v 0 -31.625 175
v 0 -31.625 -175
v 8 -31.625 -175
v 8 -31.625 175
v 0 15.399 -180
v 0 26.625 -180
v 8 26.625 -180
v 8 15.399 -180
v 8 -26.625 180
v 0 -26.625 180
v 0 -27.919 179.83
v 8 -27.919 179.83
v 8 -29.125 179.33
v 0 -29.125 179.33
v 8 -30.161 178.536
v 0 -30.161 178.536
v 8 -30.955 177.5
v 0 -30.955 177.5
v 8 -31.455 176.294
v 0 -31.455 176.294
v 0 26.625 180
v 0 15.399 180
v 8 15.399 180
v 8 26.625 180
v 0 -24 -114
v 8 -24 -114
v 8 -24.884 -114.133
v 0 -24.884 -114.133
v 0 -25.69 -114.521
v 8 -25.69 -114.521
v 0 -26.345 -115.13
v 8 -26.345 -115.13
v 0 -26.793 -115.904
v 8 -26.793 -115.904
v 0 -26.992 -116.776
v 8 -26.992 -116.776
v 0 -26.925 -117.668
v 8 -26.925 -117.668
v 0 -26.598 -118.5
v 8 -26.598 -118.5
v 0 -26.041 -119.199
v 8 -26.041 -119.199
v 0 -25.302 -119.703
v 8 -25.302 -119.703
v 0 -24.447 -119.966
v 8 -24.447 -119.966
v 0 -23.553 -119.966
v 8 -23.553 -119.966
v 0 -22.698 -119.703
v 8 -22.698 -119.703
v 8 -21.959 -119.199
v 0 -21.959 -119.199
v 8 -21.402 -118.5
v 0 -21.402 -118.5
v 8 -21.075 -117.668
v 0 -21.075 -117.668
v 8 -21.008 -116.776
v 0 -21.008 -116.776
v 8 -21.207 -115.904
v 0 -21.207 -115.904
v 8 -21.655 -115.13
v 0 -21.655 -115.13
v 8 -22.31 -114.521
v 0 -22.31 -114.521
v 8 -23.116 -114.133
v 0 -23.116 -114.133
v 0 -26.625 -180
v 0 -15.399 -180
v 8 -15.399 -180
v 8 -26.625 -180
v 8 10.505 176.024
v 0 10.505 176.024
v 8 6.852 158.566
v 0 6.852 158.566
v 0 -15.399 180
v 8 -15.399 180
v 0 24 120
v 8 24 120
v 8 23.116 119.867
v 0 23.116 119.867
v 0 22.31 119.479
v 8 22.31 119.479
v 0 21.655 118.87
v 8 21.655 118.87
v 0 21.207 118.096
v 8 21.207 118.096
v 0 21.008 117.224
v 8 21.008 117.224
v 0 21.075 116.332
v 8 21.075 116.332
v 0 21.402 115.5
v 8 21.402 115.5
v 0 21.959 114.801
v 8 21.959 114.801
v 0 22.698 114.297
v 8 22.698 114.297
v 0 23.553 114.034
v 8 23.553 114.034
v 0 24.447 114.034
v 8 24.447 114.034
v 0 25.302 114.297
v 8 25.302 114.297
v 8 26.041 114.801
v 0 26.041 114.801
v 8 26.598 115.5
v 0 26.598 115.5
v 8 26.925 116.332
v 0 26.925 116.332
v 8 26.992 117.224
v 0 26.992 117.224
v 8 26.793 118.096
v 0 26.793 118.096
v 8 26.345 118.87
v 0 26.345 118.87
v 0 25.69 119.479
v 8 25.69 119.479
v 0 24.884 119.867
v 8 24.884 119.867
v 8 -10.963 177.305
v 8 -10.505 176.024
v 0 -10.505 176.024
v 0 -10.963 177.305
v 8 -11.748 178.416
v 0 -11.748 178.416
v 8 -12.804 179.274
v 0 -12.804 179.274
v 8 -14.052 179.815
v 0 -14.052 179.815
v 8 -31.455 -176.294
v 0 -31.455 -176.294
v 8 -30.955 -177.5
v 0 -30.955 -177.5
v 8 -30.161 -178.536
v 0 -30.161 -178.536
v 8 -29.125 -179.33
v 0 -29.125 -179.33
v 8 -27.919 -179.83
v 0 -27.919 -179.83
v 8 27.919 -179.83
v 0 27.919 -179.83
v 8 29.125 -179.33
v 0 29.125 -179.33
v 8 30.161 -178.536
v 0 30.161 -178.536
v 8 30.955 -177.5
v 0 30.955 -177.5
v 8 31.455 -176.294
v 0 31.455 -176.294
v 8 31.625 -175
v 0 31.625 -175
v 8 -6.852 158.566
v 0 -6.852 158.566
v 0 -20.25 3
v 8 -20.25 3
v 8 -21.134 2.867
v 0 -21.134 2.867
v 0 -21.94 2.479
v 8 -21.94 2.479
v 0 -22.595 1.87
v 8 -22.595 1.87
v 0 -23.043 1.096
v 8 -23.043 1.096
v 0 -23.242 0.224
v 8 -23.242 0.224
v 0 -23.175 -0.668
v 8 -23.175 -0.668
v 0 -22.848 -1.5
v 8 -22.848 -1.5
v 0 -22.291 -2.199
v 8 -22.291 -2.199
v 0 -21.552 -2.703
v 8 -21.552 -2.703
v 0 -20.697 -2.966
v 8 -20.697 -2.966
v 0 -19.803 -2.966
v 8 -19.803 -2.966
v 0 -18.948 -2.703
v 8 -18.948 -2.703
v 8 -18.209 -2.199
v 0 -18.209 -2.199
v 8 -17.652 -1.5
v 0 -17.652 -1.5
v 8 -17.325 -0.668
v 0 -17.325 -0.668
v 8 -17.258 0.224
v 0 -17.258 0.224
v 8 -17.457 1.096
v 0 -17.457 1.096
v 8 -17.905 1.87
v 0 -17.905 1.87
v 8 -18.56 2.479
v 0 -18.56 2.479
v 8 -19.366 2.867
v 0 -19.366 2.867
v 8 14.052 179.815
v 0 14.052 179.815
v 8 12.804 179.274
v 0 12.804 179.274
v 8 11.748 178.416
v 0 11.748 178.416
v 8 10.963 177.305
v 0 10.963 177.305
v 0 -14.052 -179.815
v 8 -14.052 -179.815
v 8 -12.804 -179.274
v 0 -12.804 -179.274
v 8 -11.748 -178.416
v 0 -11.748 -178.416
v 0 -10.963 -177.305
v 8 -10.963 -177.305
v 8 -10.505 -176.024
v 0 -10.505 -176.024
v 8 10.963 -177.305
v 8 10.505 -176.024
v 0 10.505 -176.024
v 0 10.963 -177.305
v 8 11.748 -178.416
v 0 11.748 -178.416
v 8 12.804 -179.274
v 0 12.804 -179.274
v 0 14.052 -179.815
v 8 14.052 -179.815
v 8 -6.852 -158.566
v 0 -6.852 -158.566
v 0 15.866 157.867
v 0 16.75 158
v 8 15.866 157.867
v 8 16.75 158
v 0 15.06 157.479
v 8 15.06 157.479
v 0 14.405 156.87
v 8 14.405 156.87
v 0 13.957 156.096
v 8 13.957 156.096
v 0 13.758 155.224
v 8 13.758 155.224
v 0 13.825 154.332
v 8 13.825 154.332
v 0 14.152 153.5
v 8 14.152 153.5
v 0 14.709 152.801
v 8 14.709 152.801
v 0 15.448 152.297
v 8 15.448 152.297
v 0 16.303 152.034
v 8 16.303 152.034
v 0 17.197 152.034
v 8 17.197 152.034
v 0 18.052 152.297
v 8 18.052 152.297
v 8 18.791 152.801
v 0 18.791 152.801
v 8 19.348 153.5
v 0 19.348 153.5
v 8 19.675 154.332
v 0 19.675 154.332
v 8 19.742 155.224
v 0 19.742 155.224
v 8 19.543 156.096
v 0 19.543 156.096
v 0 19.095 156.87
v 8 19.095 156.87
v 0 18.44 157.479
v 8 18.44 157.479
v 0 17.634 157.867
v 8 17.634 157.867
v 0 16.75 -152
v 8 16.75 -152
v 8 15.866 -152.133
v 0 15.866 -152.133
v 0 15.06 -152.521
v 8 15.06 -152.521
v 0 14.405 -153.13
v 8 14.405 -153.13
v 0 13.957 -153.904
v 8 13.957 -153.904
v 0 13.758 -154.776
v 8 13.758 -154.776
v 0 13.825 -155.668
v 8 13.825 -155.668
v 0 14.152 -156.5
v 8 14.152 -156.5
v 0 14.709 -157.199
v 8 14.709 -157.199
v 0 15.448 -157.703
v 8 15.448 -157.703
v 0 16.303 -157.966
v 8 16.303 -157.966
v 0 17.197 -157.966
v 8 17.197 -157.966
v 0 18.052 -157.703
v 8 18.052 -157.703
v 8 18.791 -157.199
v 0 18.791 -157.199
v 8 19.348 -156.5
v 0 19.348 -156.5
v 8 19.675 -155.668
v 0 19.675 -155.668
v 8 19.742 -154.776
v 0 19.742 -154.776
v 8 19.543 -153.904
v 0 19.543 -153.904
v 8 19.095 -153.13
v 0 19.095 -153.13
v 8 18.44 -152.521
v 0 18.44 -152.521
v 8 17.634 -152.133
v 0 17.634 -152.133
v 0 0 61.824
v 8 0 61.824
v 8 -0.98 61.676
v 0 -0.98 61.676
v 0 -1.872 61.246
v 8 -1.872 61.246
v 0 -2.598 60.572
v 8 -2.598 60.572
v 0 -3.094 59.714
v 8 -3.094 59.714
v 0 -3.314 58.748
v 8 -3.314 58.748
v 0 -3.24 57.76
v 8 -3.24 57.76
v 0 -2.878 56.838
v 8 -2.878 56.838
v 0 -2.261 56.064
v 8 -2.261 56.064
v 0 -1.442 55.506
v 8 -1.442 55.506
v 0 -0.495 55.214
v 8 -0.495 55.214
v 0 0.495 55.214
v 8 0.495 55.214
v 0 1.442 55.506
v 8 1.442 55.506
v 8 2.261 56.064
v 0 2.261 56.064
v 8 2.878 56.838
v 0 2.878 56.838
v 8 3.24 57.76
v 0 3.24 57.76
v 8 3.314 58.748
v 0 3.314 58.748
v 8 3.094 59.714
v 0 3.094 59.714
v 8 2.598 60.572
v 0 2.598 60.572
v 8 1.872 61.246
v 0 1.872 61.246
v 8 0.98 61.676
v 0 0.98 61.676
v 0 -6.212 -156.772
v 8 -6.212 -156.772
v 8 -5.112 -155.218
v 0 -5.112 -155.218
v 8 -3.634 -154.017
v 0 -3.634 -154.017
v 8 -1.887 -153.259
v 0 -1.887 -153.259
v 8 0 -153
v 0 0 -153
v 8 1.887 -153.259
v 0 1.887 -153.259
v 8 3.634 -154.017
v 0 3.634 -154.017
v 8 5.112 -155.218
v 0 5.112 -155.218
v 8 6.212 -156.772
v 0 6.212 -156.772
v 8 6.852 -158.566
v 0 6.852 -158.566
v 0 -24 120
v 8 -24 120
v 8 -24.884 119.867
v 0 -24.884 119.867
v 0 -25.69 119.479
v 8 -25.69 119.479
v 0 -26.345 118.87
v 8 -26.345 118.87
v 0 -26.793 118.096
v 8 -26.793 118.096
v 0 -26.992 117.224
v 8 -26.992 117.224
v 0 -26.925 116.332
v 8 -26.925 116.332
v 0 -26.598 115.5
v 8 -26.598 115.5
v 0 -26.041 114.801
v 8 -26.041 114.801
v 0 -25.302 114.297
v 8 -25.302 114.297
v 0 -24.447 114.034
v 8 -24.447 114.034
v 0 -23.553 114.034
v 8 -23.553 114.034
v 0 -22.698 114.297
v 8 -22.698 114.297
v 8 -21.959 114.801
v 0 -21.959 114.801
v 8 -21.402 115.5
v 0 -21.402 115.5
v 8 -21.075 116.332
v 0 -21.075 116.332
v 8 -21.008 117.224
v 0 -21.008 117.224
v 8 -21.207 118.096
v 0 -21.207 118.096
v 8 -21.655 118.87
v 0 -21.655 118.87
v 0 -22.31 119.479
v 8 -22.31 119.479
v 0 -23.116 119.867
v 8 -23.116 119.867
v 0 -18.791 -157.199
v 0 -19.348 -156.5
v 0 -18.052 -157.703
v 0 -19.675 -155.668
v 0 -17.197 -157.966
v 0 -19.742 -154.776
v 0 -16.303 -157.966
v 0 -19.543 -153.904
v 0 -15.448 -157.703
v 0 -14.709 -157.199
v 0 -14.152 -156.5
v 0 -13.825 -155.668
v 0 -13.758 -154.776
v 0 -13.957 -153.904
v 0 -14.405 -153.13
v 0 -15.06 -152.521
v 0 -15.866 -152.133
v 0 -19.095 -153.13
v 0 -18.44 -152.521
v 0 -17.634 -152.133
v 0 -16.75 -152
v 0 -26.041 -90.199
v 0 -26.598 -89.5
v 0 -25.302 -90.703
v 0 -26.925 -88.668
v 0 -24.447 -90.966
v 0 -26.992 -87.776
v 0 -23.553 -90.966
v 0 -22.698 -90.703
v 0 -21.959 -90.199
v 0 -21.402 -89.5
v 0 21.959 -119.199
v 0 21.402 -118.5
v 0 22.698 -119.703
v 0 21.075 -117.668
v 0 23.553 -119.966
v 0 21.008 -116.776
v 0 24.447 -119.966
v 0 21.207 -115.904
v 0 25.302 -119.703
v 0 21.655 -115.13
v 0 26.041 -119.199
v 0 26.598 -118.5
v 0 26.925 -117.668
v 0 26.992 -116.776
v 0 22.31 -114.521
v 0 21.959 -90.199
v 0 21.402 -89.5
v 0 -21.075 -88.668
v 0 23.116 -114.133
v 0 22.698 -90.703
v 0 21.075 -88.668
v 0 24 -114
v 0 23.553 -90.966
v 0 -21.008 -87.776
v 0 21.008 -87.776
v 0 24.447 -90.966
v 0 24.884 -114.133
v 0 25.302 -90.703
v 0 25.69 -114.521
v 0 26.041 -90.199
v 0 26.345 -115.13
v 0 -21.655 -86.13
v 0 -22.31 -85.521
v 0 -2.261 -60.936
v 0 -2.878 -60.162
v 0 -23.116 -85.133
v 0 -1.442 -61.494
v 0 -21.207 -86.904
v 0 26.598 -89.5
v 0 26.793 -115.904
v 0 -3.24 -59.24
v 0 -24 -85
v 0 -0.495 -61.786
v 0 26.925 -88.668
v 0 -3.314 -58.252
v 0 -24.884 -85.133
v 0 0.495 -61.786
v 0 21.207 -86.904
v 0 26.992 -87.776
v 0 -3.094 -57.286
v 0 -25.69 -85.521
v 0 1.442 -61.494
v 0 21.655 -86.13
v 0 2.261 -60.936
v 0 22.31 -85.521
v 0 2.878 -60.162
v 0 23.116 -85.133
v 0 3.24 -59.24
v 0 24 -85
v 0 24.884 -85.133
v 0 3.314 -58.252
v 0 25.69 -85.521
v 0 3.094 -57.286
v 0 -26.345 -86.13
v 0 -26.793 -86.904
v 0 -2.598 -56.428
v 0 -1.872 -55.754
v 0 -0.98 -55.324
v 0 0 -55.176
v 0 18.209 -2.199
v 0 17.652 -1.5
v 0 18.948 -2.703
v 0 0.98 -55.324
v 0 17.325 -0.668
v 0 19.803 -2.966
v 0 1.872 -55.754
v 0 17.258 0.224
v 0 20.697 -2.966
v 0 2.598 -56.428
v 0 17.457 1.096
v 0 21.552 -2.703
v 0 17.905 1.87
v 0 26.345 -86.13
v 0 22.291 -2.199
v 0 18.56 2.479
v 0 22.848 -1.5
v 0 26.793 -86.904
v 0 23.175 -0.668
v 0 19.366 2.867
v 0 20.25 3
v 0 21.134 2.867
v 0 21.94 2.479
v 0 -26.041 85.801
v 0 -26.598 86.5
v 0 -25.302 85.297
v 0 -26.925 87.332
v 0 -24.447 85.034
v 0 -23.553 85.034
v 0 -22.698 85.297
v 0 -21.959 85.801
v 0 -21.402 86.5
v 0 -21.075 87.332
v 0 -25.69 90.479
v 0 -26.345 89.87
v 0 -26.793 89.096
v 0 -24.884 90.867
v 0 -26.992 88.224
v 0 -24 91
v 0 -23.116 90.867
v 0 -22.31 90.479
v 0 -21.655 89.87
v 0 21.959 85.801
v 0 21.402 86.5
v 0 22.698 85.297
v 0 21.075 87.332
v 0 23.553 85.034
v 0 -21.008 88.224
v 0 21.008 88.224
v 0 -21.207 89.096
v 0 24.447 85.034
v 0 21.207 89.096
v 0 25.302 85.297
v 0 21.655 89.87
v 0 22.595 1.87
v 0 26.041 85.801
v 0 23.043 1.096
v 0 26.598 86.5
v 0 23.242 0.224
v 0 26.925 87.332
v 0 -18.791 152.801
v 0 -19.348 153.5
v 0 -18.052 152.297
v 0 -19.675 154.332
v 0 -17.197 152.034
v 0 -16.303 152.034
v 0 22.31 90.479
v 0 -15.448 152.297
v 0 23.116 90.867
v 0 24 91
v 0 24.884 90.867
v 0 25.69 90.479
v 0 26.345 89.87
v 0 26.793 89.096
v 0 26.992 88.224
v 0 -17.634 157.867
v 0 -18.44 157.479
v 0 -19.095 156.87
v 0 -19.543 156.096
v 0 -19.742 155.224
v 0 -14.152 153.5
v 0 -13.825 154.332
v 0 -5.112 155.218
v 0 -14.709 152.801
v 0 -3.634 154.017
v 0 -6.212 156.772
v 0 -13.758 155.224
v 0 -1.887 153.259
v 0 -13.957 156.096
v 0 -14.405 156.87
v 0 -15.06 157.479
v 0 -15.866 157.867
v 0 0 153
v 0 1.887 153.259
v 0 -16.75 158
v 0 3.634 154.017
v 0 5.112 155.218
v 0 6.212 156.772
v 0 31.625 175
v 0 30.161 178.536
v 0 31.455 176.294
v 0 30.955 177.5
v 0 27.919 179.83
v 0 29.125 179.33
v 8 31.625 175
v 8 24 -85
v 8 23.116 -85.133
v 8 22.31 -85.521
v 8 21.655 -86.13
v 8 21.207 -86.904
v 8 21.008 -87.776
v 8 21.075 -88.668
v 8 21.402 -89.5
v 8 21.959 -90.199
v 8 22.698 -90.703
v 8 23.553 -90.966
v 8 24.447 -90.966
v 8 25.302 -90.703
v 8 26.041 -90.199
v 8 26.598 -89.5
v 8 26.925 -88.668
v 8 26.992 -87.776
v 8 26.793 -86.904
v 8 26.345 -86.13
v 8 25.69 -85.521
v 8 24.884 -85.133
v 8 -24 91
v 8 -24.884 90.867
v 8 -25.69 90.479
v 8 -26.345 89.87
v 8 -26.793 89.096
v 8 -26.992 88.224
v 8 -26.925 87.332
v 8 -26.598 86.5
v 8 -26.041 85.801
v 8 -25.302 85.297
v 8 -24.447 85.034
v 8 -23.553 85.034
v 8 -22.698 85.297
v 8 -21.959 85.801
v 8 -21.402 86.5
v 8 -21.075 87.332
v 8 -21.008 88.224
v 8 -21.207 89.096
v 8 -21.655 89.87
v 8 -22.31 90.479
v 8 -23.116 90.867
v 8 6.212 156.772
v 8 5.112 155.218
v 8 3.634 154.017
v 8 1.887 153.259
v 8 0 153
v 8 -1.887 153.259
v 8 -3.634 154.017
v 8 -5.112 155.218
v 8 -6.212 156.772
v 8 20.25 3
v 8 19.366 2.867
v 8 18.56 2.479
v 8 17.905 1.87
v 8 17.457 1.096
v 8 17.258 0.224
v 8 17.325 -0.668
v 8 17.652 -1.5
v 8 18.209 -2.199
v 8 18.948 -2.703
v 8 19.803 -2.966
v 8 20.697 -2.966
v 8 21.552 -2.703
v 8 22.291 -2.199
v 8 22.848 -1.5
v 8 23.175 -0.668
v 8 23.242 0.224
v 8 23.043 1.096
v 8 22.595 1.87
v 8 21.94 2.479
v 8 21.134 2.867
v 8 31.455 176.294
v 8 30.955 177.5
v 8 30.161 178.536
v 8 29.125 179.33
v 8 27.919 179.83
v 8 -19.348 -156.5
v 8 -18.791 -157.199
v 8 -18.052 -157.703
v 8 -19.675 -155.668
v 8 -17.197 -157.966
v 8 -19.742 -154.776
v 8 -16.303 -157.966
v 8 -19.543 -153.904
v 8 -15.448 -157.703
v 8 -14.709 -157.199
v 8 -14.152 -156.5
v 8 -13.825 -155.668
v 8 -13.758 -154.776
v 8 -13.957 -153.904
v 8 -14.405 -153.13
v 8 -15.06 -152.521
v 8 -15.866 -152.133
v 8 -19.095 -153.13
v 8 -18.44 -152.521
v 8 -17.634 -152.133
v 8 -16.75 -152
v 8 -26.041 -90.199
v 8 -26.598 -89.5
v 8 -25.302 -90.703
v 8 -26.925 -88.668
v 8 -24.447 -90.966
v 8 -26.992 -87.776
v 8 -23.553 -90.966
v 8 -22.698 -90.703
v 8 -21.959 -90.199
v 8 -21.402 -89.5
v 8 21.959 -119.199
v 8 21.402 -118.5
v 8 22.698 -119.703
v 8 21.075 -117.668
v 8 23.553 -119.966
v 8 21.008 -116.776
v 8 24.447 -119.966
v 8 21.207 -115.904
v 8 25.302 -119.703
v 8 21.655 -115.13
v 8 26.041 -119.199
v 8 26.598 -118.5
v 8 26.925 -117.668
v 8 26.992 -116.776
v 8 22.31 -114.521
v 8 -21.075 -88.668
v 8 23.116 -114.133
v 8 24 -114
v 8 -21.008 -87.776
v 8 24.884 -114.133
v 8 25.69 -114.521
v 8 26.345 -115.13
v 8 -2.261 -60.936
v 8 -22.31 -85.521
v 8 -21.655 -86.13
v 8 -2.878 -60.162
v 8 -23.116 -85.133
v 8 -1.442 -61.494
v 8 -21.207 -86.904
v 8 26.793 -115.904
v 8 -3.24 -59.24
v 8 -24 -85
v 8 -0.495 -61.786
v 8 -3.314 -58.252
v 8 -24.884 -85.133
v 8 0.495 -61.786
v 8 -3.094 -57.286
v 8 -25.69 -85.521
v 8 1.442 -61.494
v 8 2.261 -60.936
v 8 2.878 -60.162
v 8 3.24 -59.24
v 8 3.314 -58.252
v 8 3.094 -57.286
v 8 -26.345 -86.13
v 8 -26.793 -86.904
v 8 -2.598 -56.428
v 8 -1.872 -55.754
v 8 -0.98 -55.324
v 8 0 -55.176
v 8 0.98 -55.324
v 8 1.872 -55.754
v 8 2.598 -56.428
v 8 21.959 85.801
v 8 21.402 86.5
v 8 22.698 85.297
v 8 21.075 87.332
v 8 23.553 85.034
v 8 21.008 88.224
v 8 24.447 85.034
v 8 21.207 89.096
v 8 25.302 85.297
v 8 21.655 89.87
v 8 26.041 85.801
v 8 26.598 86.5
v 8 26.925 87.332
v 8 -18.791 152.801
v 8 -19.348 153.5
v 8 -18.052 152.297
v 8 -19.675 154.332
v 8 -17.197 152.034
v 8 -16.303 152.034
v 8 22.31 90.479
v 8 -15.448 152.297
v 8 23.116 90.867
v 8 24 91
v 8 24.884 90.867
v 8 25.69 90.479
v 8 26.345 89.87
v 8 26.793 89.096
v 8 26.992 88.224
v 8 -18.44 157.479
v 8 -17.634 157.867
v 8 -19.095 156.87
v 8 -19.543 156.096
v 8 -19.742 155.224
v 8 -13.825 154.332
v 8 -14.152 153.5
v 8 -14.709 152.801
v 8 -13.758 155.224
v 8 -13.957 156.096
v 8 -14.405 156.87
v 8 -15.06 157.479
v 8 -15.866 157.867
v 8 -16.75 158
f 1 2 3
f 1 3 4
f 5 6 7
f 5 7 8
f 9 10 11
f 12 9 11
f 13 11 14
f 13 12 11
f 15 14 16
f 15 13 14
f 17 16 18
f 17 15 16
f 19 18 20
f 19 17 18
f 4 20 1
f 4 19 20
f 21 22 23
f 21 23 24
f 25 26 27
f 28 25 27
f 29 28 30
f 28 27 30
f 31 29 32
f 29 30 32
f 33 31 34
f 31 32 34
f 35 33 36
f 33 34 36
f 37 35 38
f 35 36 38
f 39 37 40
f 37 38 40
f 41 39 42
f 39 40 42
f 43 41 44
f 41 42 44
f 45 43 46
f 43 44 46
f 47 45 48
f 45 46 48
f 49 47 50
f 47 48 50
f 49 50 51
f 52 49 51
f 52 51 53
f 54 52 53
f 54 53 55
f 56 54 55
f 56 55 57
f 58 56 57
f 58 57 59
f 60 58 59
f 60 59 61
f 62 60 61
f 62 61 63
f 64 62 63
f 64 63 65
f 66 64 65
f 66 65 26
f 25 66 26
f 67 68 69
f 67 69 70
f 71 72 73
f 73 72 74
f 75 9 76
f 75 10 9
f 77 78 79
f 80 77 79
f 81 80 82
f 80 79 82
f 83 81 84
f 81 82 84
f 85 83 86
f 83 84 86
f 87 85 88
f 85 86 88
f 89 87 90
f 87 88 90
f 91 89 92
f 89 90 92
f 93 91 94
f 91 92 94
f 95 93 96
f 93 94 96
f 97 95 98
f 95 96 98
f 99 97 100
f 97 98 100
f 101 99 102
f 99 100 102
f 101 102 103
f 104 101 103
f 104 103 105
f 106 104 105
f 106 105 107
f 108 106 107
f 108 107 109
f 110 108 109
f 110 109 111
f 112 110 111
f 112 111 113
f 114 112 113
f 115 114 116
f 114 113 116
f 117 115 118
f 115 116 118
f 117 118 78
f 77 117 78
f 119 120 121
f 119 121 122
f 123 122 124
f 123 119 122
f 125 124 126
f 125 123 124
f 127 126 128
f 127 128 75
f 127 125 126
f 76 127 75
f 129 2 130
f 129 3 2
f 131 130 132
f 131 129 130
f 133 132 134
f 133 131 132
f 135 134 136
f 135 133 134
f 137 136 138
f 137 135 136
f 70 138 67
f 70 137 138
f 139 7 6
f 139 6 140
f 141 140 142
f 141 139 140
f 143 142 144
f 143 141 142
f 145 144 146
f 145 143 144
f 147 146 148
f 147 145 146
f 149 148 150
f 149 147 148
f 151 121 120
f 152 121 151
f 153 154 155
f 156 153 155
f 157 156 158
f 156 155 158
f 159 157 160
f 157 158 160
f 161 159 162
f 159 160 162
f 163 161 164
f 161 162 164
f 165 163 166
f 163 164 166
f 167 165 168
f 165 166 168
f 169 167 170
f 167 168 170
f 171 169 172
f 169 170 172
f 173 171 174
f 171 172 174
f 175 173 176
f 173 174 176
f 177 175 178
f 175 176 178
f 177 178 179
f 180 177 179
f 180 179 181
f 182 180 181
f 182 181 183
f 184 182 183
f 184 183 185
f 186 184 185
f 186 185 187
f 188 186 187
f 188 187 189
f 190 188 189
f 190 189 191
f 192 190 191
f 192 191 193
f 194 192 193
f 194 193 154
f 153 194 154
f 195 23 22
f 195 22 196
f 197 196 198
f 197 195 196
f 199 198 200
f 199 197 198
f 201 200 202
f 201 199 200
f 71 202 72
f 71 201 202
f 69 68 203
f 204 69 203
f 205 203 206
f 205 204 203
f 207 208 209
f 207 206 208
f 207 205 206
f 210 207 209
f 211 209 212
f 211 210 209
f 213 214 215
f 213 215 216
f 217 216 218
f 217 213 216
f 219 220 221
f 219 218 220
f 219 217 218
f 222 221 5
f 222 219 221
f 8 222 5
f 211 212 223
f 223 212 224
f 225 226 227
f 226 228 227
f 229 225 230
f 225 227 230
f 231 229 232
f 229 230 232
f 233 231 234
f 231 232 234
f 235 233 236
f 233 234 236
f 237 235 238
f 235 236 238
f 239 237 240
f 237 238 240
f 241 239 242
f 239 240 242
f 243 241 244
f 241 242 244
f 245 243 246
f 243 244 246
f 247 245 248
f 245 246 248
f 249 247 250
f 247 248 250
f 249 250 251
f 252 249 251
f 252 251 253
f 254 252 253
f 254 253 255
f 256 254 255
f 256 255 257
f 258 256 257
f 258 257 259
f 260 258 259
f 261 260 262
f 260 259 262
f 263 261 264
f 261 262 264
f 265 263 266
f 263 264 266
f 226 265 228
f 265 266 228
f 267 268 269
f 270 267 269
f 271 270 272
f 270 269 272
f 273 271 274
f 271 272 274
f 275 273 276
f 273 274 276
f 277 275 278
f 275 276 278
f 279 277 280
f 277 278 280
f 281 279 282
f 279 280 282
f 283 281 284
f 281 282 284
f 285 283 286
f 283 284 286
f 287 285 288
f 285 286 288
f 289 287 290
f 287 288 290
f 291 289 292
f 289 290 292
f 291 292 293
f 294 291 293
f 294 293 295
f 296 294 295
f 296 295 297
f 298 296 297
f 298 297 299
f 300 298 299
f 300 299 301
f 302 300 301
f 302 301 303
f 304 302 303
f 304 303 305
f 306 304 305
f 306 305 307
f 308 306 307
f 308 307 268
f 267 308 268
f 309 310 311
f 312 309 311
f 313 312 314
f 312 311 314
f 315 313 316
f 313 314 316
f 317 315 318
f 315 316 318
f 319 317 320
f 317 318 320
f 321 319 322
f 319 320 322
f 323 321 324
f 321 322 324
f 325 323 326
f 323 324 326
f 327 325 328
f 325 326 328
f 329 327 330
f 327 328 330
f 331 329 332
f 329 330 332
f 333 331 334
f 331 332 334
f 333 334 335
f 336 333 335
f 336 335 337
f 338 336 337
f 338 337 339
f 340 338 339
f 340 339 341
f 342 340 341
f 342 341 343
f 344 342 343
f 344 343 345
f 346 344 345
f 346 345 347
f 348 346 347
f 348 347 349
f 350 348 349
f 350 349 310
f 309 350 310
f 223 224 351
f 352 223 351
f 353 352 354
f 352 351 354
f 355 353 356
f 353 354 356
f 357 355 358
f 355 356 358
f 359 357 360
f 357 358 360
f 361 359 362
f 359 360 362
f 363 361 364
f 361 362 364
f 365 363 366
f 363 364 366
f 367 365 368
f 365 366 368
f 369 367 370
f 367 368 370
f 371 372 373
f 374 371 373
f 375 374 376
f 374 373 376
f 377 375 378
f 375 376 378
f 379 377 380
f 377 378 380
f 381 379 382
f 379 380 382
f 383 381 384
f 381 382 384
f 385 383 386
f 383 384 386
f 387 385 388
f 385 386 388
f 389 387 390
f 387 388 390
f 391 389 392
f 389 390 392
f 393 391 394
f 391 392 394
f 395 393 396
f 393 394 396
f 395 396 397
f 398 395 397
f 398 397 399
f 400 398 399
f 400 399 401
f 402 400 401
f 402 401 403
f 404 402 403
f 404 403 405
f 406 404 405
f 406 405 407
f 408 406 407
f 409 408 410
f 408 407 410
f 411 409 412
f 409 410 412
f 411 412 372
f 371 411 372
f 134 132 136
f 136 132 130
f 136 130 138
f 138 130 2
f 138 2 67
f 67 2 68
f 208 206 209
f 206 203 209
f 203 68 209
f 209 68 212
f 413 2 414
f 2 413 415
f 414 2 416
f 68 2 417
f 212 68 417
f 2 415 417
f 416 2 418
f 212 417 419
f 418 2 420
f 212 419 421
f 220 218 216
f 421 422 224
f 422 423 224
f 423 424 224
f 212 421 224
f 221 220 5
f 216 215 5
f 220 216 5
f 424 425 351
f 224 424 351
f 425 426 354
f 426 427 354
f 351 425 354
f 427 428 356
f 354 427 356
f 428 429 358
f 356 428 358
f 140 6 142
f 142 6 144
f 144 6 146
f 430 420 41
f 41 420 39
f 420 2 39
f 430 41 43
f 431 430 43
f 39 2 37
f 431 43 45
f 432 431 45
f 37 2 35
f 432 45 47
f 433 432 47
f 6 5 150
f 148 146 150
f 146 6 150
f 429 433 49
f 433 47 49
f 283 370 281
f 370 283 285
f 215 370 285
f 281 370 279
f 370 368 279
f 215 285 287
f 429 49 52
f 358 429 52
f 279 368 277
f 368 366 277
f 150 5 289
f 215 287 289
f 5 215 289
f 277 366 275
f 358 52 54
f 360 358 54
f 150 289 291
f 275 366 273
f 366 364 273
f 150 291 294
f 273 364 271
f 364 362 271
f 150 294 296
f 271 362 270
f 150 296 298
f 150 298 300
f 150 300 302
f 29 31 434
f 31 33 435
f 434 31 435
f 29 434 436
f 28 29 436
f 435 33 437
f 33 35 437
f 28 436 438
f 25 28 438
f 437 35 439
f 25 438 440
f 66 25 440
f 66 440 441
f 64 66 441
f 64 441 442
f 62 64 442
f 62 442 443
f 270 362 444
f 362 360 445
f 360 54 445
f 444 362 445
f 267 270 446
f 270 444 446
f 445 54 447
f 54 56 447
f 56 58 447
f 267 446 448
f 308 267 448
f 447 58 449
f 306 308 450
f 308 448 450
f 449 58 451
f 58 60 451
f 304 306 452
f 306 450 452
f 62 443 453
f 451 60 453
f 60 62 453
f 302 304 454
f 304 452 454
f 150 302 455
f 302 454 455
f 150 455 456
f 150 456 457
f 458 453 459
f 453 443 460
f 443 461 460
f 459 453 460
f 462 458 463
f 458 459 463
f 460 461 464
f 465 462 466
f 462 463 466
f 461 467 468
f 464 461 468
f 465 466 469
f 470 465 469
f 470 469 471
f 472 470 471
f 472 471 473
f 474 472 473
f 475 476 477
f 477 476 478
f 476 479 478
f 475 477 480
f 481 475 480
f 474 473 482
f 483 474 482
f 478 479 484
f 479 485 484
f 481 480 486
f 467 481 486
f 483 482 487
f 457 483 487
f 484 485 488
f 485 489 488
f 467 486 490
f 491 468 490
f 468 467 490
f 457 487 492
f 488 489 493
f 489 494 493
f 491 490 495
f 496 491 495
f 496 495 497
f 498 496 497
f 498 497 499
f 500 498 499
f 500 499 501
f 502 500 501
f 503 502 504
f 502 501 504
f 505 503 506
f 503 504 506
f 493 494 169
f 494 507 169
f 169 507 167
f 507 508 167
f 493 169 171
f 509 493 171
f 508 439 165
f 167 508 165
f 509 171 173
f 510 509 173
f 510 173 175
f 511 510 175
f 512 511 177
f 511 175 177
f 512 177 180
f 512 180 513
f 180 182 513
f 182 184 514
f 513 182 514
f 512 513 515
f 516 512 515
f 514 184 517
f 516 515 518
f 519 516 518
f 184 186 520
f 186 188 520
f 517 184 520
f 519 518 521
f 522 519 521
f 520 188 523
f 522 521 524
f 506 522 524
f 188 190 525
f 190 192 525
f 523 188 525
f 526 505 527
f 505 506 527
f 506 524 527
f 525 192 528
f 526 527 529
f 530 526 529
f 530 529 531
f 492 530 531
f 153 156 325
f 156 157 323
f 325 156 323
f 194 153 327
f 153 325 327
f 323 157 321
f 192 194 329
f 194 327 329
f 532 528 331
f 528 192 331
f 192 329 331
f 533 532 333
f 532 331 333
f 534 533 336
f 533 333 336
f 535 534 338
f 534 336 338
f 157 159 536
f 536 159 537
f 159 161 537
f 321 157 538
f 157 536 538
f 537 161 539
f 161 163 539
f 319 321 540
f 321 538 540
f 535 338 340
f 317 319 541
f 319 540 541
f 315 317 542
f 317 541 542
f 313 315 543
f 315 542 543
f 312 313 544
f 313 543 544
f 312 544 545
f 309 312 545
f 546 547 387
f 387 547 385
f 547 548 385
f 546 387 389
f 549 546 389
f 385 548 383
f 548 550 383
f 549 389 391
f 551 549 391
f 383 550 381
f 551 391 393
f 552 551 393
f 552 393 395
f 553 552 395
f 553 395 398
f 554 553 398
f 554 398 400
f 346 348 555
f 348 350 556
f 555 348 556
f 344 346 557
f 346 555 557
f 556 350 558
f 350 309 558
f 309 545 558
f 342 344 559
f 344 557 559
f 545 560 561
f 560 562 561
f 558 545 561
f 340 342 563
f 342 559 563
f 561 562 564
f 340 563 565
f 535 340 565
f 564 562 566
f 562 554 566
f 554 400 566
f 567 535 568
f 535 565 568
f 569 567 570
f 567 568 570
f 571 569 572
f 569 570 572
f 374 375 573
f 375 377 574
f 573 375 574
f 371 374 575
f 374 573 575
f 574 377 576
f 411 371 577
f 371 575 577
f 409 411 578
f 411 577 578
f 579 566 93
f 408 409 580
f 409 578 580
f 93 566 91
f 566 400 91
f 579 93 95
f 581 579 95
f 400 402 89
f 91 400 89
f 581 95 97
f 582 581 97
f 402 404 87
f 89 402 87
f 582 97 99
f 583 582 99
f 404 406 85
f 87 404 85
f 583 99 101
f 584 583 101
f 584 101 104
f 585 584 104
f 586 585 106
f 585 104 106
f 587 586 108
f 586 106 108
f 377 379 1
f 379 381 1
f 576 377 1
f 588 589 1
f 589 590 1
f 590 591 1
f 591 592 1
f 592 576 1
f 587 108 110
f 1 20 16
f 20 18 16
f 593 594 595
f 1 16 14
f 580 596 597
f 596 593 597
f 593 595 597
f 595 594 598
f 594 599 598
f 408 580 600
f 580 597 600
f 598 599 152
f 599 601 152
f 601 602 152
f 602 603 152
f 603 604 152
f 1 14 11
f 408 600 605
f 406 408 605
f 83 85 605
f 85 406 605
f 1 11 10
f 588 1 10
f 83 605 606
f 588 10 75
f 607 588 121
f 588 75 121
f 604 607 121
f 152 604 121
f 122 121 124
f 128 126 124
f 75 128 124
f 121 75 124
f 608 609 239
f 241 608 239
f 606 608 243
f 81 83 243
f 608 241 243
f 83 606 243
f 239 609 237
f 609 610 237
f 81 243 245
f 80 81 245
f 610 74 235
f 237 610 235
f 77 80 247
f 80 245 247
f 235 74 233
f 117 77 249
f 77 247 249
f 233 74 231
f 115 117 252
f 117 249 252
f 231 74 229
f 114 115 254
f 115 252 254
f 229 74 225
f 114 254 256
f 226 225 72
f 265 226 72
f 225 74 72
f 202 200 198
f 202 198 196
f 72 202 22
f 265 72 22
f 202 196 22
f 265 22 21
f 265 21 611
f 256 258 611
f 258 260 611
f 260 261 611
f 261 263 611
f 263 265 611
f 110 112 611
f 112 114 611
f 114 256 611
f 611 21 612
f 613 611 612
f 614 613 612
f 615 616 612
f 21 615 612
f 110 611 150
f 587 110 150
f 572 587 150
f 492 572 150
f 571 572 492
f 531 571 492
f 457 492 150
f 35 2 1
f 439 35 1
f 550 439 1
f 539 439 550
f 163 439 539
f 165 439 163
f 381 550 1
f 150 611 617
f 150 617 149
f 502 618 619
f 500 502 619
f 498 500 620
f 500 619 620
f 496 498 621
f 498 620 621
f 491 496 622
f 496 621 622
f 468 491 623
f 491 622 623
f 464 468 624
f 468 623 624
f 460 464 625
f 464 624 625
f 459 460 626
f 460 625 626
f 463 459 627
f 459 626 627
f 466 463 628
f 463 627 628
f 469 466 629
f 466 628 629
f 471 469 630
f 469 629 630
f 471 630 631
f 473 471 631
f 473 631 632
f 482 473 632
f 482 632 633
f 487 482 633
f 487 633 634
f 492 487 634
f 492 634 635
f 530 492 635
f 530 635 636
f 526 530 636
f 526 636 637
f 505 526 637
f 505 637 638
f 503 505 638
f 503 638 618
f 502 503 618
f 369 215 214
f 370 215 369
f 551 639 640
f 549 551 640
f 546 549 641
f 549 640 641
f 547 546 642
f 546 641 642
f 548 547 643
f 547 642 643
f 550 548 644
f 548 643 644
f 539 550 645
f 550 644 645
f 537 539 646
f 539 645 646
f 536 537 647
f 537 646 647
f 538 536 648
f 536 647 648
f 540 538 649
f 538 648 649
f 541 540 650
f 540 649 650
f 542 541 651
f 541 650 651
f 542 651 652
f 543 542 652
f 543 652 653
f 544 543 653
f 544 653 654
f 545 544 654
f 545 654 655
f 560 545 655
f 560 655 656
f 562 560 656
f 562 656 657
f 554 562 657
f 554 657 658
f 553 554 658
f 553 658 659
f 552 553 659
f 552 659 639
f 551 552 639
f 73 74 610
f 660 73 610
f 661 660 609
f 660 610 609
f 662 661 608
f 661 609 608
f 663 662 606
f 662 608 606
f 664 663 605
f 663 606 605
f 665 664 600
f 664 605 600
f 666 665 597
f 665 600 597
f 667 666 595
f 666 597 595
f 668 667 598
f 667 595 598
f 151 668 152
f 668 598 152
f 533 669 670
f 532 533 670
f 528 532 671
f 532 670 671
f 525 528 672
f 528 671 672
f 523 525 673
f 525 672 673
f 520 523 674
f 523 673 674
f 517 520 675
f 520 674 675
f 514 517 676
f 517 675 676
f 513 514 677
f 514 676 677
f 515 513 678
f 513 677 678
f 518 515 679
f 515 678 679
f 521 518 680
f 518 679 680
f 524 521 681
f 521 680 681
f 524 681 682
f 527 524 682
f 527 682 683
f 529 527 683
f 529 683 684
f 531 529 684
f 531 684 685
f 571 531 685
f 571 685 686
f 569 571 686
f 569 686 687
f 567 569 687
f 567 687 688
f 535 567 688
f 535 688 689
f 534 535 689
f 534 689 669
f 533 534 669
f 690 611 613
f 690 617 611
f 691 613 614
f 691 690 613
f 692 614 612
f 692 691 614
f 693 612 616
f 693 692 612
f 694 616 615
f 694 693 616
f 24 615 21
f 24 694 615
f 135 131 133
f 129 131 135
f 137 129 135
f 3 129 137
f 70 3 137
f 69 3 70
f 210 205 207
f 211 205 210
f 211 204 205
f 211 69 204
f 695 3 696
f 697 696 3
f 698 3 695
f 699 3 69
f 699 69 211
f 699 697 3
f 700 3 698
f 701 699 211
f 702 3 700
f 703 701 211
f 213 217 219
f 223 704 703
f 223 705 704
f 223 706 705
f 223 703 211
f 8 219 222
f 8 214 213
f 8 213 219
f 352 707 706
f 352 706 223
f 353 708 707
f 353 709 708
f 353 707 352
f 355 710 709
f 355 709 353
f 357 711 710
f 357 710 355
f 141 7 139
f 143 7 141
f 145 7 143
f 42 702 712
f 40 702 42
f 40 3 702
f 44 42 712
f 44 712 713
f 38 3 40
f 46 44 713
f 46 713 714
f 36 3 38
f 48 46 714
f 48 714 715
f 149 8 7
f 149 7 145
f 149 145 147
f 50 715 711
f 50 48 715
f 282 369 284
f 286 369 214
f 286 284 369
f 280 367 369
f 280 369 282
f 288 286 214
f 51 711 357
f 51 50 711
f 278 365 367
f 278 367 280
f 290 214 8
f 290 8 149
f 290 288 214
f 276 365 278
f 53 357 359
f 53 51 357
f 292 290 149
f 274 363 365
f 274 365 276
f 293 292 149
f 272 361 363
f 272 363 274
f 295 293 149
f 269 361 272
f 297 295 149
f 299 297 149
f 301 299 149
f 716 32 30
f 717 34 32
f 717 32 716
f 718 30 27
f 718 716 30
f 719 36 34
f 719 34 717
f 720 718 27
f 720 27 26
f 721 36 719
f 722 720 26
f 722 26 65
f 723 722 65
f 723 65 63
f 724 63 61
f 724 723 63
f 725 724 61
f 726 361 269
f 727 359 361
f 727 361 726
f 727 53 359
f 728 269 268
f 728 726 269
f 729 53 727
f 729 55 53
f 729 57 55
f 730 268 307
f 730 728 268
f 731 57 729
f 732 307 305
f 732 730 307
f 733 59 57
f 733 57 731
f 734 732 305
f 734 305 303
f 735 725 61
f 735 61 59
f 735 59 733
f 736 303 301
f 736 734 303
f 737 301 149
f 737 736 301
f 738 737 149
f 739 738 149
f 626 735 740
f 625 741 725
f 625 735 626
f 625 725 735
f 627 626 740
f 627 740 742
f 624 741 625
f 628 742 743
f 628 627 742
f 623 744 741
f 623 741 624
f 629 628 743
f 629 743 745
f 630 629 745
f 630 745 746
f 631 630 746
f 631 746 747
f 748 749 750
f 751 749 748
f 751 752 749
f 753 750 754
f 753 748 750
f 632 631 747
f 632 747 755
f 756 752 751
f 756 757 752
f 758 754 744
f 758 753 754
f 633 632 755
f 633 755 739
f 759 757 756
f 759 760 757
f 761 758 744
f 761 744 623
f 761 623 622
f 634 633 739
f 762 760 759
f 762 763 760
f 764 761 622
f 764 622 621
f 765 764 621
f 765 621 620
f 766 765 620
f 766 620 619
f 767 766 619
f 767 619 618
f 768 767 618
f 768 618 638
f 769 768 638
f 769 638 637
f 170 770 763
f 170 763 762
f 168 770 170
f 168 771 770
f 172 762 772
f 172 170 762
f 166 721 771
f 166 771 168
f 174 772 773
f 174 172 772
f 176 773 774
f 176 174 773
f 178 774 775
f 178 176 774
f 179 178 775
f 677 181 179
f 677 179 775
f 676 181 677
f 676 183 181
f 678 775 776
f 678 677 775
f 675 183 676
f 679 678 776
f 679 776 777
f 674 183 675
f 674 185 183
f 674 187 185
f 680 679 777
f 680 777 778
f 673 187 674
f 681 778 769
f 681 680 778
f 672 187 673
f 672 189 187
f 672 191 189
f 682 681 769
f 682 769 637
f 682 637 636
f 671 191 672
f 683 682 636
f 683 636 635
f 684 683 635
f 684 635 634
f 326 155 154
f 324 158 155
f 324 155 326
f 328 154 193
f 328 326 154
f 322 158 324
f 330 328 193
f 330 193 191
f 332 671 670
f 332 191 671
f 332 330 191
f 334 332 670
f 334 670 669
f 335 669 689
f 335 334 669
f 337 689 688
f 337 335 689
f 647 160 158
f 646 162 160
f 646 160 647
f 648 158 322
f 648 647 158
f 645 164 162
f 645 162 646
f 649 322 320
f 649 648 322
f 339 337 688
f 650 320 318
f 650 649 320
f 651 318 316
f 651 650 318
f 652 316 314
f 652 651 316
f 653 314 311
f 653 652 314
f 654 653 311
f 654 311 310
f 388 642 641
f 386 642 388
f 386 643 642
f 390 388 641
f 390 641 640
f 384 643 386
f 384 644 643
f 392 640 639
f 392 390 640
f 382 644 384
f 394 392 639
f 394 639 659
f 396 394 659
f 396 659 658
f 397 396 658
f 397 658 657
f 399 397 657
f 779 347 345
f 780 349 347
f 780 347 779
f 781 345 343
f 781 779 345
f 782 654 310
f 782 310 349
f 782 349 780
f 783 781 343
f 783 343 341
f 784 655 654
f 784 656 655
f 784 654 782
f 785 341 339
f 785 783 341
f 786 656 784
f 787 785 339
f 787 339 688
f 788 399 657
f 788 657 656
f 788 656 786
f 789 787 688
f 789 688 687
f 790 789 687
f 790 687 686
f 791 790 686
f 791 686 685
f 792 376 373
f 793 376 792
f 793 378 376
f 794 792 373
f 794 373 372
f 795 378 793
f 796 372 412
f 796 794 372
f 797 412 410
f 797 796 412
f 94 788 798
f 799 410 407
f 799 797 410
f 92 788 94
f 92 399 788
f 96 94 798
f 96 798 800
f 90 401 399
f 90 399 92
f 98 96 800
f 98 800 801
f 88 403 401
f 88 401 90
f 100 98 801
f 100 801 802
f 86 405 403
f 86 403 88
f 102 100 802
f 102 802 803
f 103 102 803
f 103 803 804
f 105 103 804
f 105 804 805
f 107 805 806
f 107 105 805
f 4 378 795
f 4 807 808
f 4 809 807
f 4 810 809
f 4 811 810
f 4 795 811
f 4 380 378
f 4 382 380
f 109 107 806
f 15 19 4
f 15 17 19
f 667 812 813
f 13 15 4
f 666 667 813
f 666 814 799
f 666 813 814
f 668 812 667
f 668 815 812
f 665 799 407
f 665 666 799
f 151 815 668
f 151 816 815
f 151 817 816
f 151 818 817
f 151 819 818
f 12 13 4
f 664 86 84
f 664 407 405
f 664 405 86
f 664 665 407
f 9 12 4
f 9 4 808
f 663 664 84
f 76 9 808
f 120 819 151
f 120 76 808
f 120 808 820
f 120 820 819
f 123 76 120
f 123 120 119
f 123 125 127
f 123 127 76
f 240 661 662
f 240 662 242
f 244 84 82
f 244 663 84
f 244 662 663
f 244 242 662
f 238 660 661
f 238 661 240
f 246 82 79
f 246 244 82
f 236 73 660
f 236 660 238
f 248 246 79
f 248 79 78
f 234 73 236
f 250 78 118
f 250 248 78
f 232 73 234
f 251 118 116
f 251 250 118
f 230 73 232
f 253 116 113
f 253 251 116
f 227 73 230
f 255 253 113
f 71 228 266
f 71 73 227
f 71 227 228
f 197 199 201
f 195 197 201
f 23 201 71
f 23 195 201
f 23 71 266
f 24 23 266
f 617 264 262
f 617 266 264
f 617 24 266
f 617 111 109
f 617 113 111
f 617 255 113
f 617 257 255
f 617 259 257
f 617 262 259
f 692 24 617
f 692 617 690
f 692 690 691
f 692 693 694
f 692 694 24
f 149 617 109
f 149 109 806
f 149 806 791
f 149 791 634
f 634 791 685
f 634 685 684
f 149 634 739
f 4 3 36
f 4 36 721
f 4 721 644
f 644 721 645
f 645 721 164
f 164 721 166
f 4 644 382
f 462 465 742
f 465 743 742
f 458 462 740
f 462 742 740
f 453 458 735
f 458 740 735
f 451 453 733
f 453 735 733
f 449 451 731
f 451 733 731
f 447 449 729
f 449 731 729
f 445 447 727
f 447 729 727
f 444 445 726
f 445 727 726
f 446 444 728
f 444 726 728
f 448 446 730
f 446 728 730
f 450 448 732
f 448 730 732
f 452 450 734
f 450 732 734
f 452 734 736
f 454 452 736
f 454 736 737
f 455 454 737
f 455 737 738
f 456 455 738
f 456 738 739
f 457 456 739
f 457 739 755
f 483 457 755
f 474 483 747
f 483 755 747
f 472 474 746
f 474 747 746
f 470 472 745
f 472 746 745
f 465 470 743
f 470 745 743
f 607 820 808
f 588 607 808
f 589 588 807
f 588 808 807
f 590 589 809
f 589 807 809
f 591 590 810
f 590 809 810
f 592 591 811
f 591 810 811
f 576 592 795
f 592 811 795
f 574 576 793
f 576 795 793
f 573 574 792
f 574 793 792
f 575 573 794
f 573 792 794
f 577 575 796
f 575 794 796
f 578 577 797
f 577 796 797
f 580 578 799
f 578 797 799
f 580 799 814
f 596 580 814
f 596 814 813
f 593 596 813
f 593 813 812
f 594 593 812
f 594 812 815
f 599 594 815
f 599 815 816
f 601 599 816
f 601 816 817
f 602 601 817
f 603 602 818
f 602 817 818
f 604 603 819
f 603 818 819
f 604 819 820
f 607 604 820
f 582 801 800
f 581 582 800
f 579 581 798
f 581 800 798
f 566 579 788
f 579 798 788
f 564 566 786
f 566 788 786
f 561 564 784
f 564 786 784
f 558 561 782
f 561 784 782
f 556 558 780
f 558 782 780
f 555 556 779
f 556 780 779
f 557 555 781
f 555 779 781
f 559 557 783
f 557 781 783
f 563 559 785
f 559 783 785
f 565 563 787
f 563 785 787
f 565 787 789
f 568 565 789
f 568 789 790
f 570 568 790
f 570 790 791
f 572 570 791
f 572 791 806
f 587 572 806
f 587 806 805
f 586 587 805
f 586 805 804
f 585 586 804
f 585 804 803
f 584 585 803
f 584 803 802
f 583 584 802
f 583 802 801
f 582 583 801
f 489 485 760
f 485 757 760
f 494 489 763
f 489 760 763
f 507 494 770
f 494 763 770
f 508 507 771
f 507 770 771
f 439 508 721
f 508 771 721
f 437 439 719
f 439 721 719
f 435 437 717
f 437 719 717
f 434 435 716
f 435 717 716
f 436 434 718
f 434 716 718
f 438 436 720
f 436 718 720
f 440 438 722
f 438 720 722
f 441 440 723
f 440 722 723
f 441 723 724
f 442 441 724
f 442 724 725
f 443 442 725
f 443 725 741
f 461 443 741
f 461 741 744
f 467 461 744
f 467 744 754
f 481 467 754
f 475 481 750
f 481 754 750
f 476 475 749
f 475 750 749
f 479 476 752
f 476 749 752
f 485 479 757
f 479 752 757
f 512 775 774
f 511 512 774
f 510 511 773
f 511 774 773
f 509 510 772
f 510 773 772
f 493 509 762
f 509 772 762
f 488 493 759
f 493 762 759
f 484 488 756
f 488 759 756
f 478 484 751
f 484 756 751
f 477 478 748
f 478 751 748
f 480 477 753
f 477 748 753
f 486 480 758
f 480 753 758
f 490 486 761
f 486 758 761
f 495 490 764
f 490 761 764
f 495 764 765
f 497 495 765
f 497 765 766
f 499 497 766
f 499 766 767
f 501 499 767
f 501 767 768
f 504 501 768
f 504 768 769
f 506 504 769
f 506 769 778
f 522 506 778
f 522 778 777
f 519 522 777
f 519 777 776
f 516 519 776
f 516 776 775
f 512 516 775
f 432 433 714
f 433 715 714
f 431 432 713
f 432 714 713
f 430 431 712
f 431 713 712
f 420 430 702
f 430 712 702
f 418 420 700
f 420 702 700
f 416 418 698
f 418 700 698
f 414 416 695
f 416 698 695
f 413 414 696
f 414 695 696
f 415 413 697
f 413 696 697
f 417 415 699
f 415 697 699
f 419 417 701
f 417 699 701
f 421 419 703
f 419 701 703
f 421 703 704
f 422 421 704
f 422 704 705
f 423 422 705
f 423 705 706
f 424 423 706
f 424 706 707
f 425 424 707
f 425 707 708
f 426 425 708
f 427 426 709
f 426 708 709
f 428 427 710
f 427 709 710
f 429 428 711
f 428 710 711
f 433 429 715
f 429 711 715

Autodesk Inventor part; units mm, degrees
ref_plane "YZ Plane" through (0, 0, 0) normal (1, 0, 0) x (0, 1, 0)
ref_plane "XZ Plane" through (0, 0, 0) normal (0, 1, 0) x (-1, 0, 0)
ref_plane "XY Plane" through (0, 0, 0) normal (0, 0, 1) x (1, 0, 0)
sketch "Sketch1" plane through (0, 0, 0) normal (1, 0, 0) x (0, 1, 0)
  line L0 (31.625, -180) -> (-31.625, -180)
  line L1 (-31.625, -180) -> (-31.625, 180)
  line L2 (-31.625, 180) -> (31.625, 180)
  line L3 (31.625, 180) -> (31.625, -180)
  line L4 (31.625, -180) -> (-31.625, 180) construction
  line L5 (-31.625, -180) -> (31.625, 180) construction
  line L6 (-31.625, 0) -> (31.625, 0) construction
  line L7 (0, 180) -> (0, -180) construction
  line L8 (24, -88) -> (-24, -88) construction
  line L9 (24, -117) -> (-24, -117) construction
  line L10 (16.75, -155) -> (-16.75, -155) construction
  line L11 (24, 88) -> (-24, 88) construction
  line L12 (24, 117) -> (-24, 117) construction
  line L13 (16.75, 155) -> (-16.75, 155) construction
  line L14 (24, -117) -> (24, -88) construction
  arc A0 (-6.8516, 158.566) -> (6.8516, 158.566) centre (0, 160) ccw
  line L15 (-15, 197.5) -> (15, 197.5)
  line L16 (15, 197.5) -> (6.8516, 158.566)
  line L17 (-15, 197.5) -> (-6.8516, 158.566)
  arc A1 (6.8516, -158.566) -> (-6.8516, -158.566) centre (0, -160) ccw
  line L18 (-15, -197.5) -> (15, -197.5)
  line L19 (15, -197.5) -> (6.8516, -158.566)
  line L20 (-15, -197.5) -> (-6.8516, -158.566)
  point P0 (0, 0)
  point P1 (-20.25, 0)
  point P2 (20.25, 0)
  point P3 (0, 155)
  point P4 (-11.3374, -180)
  point P5 (11.3374, -180)
  point P6 (11.3374, 180)
  point P7 (-11.3374, 180)
  point P8 (0, 58.5)
  point P9 (0, -58.5)
  dimension "d0" = 63.25
  dimension "d1" = 360
  dimension "d2" = 40.5
  dimension "d3" = 176
  dimension "d4" = 29
  dimension "d5" = 48
  dimension "d6" = 33.5
  dimension "d7" = 310
  dimension "d8" = 30
  dimension "d9" = 37.5
  dimension "d10" = 14
  dimension "d11" = 320
  dimension "d21" = 117
extrude "Extrusion1" add sketch "Sketch1" along normal blind 8 contours L0 L19 A1 L20 L1 L2 L17 A0 L16 L3
hole "Phi6-H7" at (0, -20.25, 0) at (0, 20.25, 0) at (0, 24, -88) at (0, 24, -117) at (0, 16.75, -155) at (0, -24, -88) at (0, -24, -117) at (0, -16.75, -155) at (0, 24, 88) at (0, 24, 117) at (0, 16.75, 155) at (0, -16.75, 155) at (0, -24, 117) at (0, -24, 88) at (0, 0, 160) at (0, 0, -160) direction (1, 0, 0) diameter 6 end through all
hole "M8" at (0, 0, 58.5) at (0, 0, -58.5) direction (1, 0, 0) diameter 6.647 end through all thread size "M8x1.25" class "6H" standard "ANSI Metric M Profile"
fillet "R5" radius 5 8 edges at (4, 31.625, 180) (4, -31.625, 180) (4, 31.625, -180) (4, 11.3374, -180) (4, -11.3374, -180) (4, -31.625, -180) (4, -11.3374, 180) (4, 11.3374, 180)
properties part number "InitialPositioningFrame" material "Aluminum 7075"
